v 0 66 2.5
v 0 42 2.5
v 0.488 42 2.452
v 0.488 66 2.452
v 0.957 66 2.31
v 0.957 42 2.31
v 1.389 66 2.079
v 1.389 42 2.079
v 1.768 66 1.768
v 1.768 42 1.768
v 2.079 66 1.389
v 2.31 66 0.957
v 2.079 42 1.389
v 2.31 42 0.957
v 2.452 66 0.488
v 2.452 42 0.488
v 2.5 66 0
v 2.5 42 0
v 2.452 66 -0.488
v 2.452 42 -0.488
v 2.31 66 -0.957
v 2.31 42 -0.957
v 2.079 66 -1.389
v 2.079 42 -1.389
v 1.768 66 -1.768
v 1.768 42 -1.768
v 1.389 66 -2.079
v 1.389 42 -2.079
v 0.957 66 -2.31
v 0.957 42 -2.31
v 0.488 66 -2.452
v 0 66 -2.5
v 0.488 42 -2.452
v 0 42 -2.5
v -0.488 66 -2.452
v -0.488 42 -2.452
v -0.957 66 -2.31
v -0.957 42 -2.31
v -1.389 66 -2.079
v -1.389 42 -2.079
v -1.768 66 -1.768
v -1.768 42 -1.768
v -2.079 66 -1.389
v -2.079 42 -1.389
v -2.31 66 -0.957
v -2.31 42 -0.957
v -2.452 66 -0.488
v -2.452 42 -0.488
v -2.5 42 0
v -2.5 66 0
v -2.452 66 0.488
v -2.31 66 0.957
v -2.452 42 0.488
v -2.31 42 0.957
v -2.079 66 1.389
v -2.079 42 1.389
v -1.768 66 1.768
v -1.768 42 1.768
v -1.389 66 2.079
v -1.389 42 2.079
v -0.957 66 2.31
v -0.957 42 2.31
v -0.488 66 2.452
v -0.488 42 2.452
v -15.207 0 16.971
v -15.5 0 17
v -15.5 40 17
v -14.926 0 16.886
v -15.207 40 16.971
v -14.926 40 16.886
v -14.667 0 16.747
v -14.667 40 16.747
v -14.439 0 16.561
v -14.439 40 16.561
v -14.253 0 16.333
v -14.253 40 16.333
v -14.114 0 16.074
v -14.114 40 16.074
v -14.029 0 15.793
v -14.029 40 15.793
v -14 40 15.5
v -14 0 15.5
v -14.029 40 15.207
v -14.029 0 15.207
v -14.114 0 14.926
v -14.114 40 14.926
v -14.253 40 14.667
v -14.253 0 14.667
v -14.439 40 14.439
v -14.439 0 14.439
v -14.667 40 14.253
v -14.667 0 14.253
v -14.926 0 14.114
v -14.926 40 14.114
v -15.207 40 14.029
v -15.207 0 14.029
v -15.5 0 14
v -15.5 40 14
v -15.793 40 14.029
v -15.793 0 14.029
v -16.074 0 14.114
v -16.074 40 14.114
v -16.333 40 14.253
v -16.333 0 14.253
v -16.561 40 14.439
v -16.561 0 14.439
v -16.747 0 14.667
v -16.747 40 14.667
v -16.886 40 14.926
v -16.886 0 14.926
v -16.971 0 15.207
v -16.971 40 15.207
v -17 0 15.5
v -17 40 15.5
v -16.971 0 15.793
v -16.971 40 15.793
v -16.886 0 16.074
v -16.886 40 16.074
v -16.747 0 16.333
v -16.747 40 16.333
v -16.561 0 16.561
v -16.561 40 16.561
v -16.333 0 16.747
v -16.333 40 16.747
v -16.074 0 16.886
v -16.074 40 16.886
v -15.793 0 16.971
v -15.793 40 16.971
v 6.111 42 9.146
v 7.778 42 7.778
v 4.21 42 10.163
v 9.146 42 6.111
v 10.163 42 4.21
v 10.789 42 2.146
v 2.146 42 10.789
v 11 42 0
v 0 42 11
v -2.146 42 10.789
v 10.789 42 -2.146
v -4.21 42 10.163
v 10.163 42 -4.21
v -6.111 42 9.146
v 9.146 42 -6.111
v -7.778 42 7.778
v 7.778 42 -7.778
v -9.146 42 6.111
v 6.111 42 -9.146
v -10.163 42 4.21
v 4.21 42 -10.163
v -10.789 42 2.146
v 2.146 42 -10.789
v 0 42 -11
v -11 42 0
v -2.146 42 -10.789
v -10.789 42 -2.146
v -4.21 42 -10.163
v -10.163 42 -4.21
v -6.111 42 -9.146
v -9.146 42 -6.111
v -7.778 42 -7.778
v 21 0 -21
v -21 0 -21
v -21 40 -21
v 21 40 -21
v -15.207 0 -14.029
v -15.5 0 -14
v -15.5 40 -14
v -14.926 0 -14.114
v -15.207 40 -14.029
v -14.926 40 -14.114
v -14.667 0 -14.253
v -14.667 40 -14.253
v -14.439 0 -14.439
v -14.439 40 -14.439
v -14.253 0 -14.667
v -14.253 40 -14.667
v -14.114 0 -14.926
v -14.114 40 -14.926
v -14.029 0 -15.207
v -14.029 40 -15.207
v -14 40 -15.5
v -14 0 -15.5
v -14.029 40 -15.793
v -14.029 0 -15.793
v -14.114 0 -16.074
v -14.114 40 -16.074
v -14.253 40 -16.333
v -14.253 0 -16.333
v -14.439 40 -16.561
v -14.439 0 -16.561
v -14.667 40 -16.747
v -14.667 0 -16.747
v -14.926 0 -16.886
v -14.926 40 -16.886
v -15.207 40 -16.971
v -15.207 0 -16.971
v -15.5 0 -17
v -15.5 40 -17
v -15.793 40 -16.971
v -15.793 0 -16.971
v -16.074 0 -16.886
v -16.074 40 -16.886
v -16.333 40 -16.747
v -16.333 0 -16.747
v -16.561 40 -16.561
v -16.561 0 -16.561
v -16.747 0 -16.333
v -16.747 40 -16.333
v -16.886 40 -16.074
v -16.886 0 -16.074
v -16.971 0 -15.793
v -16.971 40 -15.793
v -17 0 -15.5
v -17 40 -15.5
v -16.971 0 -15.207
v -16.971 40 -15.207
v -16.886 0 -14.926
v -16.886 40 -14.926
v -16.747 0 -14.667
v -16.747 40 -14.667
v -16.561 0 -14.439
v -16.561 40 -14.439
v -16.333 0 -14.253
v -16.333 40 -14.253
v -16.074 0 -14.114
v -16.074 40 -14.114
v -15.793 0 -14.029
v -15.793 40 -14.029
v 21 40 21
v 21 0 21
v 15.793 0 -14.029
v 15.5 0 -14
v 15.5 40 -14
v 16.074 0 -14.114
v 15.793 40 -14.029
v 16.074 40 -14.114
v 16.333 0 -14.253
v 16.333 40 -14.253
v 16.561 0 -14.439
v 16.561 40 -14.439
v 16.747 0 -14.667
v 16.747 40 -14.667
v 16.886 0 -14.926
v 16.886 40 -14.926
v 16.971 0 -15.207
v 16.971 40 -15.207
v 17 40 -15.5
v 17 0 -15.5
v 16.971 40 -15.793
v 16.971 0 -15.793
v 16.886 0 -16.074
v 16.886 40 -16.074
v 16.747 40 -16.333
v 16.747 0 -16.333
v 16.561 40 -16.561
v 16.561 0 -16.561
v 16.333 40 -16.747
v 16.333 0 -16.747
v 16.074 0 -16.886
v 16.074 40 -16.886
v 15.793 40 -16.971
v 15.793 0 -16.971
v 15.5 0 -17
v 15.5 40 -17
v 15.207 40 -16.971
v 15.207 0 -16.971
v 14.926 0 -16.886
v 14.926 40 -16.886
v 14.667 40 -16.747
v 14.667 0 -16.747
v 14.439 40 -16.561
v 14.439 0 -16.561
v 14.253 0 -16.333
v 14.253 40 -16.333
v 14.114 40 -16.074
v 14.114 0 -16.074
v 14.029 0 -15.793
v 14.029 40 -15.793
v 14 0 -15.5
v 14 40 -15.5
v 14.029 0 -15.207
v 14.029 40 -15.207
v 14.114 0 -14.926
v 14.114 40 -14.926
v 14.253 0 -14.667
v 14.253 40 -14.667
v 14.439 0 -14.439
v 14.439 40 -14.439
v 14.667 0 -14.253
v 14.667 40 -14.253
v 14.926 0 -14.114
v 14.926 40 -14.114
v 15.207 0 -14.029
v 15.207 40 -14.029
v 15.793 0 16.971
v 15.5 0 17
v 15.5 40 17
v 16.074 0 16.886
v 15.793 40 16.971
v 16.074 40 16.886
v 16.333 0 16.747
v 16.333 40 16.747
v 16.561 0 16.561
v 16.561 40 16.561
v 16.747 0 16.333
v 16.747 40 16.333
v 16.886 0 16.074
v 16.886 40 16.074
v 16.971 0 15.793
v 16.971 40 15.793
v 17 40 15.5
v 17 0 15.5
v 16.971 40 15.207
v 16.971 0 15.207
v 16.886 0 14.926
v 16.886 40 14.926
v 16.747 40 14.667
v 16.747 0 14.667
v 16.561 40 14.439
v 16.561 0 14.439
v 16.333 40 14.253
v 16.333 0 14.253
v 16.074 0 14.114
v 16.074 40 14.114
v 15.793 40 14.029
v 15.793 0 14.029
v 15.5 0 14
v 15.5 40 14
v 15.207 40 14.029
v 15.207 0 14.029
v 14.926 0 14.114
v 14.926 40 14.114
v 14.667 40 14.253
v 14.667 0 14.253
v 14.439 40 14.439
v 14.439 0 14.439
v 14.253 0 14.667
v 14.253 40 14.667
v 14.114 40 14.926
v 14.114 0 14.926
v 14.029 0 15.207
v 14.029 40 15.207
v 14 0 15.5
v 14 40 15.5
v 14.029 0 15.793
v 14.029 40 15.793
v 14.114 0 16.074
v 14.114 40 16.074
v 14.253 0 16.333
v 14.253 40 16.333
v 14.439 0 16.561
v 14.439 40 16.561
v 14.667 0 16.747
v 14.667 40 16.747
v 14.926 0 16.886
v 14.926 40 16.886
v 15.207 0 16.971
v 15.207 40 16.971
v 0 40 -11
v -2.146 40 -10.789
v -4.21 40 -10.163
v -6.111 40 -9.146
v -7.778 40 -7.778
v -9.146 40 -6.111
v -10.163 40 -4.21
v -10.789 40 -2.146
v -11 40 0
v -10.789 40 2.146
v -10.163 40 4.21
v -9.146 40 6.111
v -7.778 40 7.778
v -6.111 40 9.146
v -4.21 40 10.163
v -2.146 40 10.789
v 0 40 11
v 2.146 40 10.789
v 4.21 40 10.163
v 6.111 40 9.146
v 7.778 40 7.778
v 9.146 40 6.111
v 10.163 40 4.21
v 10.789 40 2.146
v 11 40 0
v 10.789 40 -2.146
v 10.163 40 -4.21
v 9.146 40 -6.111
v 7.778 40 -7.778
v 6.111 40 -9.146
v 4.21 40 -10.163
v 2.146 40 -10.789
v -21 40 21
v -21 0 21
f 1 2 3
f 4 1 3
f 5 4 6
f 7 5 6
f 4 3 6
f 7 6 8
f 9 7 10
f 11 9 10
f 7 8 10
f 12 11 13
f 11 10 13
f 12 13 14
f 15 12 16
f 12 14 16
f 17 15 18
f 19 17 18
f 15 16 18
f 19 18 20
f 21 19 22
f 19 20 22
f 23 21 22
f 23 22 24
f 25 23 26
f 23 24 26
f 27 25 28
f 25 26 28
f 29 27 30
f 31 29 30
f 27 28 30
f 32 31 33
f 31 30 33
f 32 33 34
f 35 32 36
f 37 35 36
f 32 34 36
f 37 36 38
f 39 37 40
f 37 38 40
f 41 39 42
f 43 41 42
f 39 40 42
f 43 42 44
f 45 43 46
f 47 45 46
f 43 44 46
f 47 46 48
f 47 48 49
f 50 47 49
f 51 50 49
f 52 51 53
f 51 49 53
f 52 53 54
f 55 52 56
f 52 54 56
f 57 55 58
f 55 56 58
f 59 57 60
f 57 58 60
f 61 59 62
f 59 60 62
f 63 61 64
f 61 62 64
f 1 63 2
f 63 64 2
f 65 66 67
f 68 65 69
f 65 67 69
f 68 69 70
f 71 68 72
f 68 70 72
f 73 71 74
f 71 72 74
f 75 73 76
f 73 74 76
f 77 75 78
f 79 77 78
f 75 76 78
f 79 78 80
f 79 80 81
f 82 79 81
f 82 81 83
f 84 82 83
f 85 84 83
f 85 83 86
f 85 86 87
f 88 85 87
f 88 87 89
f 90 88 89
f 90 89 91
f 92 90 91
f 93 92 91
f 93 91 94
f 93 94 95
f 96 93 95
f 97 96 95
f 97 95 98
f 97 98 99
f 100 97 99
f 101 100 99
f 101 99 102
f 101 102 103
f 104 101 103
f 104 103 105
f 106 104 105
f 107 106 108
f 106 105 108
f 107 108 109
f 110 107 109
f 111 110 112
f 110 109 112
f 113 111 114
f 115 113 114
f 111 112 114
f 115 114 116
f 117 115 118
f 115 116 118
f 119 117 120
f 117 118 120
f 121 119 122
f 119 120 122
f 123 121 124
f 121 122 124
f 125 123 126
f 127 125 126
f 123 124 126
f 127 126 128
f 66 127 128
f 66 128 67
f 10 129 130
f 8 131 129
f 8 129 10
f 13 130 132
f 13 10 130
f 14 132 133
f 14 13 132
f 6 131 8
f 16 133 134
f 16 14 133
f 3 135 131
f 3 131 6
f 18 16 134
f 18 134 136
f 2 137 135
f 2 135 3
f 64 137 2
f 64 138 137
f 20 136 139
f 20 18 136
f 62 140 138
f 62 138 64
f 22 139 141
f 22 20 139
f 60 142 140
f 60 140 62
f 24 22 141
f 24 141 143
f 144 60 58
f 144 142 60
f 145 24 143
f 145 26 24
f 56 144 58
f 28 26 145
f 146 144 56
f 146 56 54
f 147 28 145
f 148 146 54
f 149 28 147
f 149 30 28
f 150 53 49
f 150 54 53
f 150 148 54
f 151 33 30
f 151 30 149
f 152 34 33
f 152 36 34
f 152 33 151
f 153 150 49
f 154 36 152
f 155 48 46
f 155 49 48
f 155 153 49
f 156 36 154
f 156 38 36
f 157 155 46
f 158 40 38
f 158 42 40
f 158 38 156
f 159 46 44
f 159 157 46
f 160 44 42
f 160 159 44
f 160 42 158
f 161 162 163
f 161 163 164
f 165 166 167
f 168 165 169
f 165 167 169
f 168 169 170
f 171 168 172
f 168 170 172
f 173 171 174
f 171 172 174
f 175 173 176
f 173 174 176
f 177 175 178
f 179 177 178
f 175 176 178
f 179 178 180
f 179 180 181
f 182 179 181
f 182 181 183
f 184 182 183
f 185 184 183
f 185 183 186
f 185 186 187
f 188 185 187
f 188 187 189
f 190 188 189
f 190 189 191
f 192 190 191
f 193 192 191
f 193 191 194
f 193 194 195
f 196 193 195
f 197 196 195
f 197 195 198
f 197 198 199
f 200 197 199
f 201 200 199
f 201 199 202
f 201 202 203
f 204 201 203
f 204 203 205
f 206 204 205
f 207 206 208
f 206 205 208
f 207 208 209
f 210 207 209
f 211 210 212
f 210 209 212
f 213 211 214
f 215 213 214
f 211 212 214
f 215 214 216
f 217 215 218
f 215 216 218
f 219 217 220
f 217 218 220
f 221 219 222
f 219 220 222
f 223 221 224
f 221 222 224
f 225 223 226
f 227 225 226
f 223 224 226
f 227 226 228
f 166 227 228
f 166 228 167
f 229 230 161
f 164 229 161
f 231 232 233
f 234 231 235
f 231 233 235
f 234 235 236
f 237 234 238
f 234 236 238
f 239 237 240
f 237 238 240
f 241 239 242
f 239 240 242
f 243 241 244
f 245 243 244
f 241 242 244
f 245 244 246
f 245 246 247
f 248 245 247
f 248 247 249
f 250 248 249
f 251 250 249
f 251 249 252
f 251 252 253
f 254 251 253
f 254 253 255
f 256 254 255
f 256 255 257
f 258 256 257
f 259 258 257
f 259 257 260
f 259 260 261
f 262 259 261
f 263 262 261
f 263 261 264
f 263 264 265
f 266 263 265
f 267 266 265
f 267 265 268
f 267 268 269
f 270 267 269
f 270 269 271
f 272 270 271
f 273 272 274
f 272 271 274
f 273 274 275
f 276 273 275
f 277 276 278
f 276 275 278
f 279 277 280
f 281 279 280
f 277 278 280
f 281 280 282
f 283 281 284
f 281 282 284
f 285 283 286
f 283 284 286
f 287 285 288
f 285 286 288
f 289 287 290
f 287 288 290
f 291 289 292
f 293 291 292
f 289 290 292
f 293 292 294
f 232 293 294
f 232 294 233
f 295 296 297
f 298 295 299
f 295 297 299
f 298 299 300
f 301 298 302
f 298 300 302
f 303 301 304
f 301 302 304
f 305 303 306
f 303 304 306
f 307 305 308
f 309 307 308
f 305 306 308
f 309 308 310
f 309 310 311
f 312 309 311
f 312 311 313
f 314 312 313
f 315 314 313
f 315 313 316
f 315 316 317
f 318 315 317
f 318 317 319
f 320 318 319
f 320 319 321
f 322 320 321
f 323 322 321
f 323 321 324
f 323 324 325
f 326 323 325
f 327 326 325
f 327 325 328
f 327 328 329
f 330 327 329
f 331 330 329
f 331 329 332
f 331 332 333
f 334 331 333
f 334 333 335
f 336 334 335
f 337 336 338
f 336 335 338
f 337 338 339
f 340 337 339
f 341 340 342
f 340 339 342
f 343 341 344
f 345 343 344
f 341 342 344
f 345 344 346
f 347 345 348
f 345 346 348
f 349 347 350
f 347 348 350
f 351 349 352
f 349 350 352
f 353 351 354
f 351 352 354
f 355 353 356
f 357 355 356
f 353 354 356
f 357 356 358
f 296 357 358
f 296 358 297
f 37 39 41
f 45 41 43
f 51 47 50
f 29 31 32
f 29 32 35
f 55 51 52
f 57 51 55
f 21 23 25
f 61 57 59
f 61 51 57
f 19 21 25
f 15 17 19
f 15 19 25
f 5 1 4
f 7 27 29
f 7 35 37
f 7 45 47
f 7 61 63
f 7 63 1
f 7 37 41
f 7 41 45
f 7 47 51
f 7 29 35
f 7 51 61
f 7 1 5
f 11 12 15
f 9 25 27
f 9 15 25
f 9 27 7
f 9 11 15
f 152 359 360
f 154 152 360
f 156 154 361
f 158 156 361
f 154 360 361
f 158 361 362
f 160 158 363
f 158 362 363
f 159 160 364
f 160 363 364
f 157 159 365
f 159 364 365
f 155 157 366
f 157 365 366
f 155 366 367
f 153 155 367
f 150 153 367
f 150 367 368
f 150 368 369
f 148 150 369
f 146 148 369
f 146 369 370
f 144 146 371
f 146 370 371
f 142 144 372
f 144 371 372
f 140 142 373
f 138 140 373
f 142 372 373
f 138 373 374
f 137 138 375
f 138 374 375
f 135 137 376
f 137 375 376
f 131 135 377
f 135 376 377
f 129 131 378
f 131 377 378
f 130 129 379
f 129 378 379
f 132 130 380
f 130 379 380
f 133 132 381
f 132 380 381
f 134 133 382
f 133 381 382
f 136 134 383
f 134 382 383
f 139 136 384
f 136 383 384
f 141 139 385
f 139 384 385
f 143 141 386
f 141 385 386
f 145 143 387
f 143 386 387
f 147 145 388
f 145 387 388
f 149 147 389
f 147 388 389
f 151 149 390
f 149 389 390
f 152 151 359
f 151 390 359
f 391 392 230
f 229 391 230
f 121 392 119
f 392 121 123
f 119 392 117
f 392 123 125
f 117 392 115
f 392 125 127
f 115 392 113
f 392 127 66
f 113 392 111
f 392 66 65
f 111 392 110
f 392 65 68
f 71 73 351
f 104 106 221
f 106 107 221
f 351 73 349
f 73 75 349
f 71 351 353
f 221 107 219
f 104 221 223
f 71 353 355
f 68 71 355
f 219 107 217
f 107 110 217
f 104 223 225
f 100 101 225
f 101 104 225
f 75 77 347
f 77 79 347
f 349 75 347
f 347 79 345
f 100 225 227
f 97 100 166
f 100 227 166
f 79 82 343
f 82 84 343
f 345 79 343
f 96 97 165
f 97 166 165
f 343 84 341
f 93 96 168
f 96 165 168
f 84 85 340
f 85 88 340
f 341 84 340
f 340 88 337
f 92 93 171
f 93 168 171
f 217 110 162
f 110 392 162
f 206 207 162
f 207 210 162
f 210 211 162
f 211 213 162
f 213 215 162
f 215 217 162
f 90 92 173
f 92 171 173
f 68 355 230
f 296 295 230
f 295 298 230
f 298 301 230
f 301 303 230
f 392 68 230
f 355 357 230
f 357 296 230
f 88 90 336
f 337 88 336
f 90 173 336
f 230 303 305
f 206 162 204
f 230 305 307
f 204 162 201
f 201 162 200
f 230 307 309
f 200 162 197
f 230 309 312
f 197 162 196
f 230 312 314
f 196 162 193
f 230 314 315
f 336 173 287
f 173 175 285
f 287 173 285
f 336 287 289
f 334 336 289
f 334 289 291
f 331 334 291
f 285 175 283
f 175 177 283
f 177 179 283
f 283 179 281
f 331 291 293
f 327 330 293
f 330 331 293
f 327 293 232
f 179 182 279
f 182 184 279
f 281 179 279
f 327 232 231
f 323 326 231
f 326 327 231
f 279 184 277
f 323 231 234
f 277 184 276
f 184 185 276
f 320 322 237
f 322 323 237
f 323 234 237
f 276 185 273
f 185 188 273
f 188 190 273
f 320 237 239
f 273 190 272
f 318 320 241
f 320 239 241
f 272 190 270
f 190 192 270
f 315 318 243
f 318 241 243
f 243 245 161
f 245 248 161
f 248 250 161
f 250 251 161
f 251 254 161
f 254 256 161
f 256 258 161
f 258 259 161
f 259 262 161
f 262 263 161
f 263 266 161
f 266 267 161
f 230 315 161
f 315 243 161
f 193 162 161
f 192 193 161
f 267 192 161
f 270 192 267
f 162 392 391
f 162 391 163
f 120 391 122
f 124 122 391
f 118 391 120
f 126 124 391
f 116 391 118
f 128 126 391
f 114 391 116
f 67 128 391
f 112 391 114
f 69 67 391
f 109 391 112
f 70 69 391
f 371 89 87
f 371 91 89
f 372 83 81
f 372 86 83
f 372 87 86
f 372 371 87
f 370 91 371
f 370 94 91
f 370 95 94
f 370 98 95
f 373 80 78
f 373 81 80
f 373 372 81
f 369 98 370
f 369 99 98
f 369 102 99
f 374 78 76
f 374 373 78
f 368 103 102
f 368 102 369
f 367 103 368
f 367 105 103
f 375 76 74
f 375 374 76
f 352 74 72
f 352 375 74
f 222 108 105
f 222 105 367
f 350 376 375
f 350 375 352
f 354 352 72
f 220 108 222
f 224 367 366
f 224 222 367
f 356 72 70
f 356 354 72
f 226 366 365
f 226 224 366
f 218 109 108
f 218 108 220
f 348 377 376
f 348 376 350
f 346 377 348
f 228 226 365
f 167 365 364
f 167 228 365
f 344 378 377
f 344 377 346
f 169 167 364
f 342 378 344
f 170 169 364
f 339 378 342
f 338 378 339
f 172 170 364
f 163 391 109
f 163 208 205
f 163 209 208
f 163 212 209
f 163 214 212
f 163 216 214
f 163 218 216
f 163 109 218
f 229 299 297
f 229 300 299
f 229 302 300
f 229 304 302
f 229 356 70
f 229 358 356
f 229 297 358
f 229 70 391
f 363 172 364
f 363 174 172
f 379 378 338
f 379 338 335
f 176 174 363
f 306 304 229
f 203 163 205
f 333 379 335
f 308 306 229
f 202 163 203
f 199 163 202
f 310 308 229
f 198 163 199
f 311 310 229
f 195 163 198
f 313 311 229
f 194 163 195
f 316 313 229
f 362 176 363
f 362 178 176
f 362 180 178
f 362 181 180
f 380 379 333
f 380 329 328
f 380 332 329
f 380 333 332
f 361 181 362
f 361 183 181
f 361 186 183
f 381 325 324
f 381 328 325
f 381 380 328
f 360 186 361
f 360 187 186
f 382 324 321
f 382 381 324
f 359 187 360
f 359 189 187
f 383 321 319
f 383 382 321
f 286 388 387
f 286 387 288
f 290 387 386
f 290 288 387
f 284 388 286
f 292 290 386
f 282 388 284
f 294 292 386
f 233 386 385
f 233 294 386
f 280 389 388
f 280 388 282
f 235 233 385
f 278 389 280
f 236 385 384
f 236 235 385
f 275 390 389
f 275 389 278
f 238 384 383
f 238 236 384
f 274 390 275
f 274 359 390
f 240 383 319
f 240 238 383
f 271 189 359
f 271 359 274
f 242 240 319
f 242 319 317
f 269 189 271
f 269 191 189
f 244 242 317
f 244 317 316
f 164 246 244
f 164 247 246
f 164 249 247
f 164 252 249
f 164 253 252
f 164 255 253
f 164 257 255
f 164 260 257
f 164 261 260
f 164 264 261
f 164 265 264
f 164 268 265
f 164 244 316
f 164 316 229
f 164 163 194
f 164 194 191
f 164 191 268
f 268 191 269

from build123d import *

# Parameters (mm, degrees)
SKETCH_1_W          = 42
SKETCH_1_H          = 42
EXTRUDE_1_DEPTH     = 40
SKETCH_3_R          = 1.5
CUT_EXTRUDE_1_DEPTH = 50.819674828
SKETCH_4_R          = 11
EXTRUDE_2_DEPTH     = 2
SKETCH_5_R          = 2.5
EXTRUDE_3_DEPTH     = 24


with BuildPart() as part:
    # 스케치1 → 보스-돌출1 (new body)
    with BuildSketch(Plane(origin=(0, 0, 0), x_dir=(1, 0, 0), z_dir=(0, 1, 0))):
        Rectangle(SKETCH_1_W, SKETCH_1_H)
    extrude(amount=EXTRUDE_1_DEPTH)

    # 스케치3 → 컷-돌출1 (cut, through all)
    with BuildSketch(Plane(origin=(0, 40, 0), x_dir=(1, 0, 0), z_dir=(0, 1, 0))):
        with Locations(Location((-15.5, 15.5, 0), (0, 0, 270))):
            Circle(SKETCH_3_R)
        with Locations(Location((15.5, 15.5, 0), (0, 0, 270))):
            Circle(SKETCH_3_R)
        with Locations(Location((15.5, -15.5, 0), (0, 0, 270))):
            Circle(SKETCH_3_R)
        with Locations(Location((-15.5, -15.5, 0), (0, 0, 270))):
            Circle(SKETCH_3_R)
    extrude(amount=-CUT_EXTRUDE_1_DEPTH, mode=Mode.SUBTRACT)

    # 스케치4 → 보스-돌출2 (add)
    with BuildSketch(Plane(origin=(0, 40, 0), x_dir=(1, 0, 0), z_dir=(0, 1, 0))):
        with Locations(Location((0, 0, 0), (0, 0, 90))):
            Circle(SKETCH_4_R)
    extrude(amount=EXTRUDE_2_DEPTH)

    # 스케치5 → 보스-돌출3 (add)
    with BuildSketch(Plane(origin=(0, 42, 0), x_dir=(1, 0, 0), z_dir=(0, 1, 0))):
        with Locations(Location((0, 0, 0), (0, 0, 270))):
            Circle(SKETCH_5_R)
    extrude(amount=EXTRUDE_3_DEPTH)


solid = part.part
